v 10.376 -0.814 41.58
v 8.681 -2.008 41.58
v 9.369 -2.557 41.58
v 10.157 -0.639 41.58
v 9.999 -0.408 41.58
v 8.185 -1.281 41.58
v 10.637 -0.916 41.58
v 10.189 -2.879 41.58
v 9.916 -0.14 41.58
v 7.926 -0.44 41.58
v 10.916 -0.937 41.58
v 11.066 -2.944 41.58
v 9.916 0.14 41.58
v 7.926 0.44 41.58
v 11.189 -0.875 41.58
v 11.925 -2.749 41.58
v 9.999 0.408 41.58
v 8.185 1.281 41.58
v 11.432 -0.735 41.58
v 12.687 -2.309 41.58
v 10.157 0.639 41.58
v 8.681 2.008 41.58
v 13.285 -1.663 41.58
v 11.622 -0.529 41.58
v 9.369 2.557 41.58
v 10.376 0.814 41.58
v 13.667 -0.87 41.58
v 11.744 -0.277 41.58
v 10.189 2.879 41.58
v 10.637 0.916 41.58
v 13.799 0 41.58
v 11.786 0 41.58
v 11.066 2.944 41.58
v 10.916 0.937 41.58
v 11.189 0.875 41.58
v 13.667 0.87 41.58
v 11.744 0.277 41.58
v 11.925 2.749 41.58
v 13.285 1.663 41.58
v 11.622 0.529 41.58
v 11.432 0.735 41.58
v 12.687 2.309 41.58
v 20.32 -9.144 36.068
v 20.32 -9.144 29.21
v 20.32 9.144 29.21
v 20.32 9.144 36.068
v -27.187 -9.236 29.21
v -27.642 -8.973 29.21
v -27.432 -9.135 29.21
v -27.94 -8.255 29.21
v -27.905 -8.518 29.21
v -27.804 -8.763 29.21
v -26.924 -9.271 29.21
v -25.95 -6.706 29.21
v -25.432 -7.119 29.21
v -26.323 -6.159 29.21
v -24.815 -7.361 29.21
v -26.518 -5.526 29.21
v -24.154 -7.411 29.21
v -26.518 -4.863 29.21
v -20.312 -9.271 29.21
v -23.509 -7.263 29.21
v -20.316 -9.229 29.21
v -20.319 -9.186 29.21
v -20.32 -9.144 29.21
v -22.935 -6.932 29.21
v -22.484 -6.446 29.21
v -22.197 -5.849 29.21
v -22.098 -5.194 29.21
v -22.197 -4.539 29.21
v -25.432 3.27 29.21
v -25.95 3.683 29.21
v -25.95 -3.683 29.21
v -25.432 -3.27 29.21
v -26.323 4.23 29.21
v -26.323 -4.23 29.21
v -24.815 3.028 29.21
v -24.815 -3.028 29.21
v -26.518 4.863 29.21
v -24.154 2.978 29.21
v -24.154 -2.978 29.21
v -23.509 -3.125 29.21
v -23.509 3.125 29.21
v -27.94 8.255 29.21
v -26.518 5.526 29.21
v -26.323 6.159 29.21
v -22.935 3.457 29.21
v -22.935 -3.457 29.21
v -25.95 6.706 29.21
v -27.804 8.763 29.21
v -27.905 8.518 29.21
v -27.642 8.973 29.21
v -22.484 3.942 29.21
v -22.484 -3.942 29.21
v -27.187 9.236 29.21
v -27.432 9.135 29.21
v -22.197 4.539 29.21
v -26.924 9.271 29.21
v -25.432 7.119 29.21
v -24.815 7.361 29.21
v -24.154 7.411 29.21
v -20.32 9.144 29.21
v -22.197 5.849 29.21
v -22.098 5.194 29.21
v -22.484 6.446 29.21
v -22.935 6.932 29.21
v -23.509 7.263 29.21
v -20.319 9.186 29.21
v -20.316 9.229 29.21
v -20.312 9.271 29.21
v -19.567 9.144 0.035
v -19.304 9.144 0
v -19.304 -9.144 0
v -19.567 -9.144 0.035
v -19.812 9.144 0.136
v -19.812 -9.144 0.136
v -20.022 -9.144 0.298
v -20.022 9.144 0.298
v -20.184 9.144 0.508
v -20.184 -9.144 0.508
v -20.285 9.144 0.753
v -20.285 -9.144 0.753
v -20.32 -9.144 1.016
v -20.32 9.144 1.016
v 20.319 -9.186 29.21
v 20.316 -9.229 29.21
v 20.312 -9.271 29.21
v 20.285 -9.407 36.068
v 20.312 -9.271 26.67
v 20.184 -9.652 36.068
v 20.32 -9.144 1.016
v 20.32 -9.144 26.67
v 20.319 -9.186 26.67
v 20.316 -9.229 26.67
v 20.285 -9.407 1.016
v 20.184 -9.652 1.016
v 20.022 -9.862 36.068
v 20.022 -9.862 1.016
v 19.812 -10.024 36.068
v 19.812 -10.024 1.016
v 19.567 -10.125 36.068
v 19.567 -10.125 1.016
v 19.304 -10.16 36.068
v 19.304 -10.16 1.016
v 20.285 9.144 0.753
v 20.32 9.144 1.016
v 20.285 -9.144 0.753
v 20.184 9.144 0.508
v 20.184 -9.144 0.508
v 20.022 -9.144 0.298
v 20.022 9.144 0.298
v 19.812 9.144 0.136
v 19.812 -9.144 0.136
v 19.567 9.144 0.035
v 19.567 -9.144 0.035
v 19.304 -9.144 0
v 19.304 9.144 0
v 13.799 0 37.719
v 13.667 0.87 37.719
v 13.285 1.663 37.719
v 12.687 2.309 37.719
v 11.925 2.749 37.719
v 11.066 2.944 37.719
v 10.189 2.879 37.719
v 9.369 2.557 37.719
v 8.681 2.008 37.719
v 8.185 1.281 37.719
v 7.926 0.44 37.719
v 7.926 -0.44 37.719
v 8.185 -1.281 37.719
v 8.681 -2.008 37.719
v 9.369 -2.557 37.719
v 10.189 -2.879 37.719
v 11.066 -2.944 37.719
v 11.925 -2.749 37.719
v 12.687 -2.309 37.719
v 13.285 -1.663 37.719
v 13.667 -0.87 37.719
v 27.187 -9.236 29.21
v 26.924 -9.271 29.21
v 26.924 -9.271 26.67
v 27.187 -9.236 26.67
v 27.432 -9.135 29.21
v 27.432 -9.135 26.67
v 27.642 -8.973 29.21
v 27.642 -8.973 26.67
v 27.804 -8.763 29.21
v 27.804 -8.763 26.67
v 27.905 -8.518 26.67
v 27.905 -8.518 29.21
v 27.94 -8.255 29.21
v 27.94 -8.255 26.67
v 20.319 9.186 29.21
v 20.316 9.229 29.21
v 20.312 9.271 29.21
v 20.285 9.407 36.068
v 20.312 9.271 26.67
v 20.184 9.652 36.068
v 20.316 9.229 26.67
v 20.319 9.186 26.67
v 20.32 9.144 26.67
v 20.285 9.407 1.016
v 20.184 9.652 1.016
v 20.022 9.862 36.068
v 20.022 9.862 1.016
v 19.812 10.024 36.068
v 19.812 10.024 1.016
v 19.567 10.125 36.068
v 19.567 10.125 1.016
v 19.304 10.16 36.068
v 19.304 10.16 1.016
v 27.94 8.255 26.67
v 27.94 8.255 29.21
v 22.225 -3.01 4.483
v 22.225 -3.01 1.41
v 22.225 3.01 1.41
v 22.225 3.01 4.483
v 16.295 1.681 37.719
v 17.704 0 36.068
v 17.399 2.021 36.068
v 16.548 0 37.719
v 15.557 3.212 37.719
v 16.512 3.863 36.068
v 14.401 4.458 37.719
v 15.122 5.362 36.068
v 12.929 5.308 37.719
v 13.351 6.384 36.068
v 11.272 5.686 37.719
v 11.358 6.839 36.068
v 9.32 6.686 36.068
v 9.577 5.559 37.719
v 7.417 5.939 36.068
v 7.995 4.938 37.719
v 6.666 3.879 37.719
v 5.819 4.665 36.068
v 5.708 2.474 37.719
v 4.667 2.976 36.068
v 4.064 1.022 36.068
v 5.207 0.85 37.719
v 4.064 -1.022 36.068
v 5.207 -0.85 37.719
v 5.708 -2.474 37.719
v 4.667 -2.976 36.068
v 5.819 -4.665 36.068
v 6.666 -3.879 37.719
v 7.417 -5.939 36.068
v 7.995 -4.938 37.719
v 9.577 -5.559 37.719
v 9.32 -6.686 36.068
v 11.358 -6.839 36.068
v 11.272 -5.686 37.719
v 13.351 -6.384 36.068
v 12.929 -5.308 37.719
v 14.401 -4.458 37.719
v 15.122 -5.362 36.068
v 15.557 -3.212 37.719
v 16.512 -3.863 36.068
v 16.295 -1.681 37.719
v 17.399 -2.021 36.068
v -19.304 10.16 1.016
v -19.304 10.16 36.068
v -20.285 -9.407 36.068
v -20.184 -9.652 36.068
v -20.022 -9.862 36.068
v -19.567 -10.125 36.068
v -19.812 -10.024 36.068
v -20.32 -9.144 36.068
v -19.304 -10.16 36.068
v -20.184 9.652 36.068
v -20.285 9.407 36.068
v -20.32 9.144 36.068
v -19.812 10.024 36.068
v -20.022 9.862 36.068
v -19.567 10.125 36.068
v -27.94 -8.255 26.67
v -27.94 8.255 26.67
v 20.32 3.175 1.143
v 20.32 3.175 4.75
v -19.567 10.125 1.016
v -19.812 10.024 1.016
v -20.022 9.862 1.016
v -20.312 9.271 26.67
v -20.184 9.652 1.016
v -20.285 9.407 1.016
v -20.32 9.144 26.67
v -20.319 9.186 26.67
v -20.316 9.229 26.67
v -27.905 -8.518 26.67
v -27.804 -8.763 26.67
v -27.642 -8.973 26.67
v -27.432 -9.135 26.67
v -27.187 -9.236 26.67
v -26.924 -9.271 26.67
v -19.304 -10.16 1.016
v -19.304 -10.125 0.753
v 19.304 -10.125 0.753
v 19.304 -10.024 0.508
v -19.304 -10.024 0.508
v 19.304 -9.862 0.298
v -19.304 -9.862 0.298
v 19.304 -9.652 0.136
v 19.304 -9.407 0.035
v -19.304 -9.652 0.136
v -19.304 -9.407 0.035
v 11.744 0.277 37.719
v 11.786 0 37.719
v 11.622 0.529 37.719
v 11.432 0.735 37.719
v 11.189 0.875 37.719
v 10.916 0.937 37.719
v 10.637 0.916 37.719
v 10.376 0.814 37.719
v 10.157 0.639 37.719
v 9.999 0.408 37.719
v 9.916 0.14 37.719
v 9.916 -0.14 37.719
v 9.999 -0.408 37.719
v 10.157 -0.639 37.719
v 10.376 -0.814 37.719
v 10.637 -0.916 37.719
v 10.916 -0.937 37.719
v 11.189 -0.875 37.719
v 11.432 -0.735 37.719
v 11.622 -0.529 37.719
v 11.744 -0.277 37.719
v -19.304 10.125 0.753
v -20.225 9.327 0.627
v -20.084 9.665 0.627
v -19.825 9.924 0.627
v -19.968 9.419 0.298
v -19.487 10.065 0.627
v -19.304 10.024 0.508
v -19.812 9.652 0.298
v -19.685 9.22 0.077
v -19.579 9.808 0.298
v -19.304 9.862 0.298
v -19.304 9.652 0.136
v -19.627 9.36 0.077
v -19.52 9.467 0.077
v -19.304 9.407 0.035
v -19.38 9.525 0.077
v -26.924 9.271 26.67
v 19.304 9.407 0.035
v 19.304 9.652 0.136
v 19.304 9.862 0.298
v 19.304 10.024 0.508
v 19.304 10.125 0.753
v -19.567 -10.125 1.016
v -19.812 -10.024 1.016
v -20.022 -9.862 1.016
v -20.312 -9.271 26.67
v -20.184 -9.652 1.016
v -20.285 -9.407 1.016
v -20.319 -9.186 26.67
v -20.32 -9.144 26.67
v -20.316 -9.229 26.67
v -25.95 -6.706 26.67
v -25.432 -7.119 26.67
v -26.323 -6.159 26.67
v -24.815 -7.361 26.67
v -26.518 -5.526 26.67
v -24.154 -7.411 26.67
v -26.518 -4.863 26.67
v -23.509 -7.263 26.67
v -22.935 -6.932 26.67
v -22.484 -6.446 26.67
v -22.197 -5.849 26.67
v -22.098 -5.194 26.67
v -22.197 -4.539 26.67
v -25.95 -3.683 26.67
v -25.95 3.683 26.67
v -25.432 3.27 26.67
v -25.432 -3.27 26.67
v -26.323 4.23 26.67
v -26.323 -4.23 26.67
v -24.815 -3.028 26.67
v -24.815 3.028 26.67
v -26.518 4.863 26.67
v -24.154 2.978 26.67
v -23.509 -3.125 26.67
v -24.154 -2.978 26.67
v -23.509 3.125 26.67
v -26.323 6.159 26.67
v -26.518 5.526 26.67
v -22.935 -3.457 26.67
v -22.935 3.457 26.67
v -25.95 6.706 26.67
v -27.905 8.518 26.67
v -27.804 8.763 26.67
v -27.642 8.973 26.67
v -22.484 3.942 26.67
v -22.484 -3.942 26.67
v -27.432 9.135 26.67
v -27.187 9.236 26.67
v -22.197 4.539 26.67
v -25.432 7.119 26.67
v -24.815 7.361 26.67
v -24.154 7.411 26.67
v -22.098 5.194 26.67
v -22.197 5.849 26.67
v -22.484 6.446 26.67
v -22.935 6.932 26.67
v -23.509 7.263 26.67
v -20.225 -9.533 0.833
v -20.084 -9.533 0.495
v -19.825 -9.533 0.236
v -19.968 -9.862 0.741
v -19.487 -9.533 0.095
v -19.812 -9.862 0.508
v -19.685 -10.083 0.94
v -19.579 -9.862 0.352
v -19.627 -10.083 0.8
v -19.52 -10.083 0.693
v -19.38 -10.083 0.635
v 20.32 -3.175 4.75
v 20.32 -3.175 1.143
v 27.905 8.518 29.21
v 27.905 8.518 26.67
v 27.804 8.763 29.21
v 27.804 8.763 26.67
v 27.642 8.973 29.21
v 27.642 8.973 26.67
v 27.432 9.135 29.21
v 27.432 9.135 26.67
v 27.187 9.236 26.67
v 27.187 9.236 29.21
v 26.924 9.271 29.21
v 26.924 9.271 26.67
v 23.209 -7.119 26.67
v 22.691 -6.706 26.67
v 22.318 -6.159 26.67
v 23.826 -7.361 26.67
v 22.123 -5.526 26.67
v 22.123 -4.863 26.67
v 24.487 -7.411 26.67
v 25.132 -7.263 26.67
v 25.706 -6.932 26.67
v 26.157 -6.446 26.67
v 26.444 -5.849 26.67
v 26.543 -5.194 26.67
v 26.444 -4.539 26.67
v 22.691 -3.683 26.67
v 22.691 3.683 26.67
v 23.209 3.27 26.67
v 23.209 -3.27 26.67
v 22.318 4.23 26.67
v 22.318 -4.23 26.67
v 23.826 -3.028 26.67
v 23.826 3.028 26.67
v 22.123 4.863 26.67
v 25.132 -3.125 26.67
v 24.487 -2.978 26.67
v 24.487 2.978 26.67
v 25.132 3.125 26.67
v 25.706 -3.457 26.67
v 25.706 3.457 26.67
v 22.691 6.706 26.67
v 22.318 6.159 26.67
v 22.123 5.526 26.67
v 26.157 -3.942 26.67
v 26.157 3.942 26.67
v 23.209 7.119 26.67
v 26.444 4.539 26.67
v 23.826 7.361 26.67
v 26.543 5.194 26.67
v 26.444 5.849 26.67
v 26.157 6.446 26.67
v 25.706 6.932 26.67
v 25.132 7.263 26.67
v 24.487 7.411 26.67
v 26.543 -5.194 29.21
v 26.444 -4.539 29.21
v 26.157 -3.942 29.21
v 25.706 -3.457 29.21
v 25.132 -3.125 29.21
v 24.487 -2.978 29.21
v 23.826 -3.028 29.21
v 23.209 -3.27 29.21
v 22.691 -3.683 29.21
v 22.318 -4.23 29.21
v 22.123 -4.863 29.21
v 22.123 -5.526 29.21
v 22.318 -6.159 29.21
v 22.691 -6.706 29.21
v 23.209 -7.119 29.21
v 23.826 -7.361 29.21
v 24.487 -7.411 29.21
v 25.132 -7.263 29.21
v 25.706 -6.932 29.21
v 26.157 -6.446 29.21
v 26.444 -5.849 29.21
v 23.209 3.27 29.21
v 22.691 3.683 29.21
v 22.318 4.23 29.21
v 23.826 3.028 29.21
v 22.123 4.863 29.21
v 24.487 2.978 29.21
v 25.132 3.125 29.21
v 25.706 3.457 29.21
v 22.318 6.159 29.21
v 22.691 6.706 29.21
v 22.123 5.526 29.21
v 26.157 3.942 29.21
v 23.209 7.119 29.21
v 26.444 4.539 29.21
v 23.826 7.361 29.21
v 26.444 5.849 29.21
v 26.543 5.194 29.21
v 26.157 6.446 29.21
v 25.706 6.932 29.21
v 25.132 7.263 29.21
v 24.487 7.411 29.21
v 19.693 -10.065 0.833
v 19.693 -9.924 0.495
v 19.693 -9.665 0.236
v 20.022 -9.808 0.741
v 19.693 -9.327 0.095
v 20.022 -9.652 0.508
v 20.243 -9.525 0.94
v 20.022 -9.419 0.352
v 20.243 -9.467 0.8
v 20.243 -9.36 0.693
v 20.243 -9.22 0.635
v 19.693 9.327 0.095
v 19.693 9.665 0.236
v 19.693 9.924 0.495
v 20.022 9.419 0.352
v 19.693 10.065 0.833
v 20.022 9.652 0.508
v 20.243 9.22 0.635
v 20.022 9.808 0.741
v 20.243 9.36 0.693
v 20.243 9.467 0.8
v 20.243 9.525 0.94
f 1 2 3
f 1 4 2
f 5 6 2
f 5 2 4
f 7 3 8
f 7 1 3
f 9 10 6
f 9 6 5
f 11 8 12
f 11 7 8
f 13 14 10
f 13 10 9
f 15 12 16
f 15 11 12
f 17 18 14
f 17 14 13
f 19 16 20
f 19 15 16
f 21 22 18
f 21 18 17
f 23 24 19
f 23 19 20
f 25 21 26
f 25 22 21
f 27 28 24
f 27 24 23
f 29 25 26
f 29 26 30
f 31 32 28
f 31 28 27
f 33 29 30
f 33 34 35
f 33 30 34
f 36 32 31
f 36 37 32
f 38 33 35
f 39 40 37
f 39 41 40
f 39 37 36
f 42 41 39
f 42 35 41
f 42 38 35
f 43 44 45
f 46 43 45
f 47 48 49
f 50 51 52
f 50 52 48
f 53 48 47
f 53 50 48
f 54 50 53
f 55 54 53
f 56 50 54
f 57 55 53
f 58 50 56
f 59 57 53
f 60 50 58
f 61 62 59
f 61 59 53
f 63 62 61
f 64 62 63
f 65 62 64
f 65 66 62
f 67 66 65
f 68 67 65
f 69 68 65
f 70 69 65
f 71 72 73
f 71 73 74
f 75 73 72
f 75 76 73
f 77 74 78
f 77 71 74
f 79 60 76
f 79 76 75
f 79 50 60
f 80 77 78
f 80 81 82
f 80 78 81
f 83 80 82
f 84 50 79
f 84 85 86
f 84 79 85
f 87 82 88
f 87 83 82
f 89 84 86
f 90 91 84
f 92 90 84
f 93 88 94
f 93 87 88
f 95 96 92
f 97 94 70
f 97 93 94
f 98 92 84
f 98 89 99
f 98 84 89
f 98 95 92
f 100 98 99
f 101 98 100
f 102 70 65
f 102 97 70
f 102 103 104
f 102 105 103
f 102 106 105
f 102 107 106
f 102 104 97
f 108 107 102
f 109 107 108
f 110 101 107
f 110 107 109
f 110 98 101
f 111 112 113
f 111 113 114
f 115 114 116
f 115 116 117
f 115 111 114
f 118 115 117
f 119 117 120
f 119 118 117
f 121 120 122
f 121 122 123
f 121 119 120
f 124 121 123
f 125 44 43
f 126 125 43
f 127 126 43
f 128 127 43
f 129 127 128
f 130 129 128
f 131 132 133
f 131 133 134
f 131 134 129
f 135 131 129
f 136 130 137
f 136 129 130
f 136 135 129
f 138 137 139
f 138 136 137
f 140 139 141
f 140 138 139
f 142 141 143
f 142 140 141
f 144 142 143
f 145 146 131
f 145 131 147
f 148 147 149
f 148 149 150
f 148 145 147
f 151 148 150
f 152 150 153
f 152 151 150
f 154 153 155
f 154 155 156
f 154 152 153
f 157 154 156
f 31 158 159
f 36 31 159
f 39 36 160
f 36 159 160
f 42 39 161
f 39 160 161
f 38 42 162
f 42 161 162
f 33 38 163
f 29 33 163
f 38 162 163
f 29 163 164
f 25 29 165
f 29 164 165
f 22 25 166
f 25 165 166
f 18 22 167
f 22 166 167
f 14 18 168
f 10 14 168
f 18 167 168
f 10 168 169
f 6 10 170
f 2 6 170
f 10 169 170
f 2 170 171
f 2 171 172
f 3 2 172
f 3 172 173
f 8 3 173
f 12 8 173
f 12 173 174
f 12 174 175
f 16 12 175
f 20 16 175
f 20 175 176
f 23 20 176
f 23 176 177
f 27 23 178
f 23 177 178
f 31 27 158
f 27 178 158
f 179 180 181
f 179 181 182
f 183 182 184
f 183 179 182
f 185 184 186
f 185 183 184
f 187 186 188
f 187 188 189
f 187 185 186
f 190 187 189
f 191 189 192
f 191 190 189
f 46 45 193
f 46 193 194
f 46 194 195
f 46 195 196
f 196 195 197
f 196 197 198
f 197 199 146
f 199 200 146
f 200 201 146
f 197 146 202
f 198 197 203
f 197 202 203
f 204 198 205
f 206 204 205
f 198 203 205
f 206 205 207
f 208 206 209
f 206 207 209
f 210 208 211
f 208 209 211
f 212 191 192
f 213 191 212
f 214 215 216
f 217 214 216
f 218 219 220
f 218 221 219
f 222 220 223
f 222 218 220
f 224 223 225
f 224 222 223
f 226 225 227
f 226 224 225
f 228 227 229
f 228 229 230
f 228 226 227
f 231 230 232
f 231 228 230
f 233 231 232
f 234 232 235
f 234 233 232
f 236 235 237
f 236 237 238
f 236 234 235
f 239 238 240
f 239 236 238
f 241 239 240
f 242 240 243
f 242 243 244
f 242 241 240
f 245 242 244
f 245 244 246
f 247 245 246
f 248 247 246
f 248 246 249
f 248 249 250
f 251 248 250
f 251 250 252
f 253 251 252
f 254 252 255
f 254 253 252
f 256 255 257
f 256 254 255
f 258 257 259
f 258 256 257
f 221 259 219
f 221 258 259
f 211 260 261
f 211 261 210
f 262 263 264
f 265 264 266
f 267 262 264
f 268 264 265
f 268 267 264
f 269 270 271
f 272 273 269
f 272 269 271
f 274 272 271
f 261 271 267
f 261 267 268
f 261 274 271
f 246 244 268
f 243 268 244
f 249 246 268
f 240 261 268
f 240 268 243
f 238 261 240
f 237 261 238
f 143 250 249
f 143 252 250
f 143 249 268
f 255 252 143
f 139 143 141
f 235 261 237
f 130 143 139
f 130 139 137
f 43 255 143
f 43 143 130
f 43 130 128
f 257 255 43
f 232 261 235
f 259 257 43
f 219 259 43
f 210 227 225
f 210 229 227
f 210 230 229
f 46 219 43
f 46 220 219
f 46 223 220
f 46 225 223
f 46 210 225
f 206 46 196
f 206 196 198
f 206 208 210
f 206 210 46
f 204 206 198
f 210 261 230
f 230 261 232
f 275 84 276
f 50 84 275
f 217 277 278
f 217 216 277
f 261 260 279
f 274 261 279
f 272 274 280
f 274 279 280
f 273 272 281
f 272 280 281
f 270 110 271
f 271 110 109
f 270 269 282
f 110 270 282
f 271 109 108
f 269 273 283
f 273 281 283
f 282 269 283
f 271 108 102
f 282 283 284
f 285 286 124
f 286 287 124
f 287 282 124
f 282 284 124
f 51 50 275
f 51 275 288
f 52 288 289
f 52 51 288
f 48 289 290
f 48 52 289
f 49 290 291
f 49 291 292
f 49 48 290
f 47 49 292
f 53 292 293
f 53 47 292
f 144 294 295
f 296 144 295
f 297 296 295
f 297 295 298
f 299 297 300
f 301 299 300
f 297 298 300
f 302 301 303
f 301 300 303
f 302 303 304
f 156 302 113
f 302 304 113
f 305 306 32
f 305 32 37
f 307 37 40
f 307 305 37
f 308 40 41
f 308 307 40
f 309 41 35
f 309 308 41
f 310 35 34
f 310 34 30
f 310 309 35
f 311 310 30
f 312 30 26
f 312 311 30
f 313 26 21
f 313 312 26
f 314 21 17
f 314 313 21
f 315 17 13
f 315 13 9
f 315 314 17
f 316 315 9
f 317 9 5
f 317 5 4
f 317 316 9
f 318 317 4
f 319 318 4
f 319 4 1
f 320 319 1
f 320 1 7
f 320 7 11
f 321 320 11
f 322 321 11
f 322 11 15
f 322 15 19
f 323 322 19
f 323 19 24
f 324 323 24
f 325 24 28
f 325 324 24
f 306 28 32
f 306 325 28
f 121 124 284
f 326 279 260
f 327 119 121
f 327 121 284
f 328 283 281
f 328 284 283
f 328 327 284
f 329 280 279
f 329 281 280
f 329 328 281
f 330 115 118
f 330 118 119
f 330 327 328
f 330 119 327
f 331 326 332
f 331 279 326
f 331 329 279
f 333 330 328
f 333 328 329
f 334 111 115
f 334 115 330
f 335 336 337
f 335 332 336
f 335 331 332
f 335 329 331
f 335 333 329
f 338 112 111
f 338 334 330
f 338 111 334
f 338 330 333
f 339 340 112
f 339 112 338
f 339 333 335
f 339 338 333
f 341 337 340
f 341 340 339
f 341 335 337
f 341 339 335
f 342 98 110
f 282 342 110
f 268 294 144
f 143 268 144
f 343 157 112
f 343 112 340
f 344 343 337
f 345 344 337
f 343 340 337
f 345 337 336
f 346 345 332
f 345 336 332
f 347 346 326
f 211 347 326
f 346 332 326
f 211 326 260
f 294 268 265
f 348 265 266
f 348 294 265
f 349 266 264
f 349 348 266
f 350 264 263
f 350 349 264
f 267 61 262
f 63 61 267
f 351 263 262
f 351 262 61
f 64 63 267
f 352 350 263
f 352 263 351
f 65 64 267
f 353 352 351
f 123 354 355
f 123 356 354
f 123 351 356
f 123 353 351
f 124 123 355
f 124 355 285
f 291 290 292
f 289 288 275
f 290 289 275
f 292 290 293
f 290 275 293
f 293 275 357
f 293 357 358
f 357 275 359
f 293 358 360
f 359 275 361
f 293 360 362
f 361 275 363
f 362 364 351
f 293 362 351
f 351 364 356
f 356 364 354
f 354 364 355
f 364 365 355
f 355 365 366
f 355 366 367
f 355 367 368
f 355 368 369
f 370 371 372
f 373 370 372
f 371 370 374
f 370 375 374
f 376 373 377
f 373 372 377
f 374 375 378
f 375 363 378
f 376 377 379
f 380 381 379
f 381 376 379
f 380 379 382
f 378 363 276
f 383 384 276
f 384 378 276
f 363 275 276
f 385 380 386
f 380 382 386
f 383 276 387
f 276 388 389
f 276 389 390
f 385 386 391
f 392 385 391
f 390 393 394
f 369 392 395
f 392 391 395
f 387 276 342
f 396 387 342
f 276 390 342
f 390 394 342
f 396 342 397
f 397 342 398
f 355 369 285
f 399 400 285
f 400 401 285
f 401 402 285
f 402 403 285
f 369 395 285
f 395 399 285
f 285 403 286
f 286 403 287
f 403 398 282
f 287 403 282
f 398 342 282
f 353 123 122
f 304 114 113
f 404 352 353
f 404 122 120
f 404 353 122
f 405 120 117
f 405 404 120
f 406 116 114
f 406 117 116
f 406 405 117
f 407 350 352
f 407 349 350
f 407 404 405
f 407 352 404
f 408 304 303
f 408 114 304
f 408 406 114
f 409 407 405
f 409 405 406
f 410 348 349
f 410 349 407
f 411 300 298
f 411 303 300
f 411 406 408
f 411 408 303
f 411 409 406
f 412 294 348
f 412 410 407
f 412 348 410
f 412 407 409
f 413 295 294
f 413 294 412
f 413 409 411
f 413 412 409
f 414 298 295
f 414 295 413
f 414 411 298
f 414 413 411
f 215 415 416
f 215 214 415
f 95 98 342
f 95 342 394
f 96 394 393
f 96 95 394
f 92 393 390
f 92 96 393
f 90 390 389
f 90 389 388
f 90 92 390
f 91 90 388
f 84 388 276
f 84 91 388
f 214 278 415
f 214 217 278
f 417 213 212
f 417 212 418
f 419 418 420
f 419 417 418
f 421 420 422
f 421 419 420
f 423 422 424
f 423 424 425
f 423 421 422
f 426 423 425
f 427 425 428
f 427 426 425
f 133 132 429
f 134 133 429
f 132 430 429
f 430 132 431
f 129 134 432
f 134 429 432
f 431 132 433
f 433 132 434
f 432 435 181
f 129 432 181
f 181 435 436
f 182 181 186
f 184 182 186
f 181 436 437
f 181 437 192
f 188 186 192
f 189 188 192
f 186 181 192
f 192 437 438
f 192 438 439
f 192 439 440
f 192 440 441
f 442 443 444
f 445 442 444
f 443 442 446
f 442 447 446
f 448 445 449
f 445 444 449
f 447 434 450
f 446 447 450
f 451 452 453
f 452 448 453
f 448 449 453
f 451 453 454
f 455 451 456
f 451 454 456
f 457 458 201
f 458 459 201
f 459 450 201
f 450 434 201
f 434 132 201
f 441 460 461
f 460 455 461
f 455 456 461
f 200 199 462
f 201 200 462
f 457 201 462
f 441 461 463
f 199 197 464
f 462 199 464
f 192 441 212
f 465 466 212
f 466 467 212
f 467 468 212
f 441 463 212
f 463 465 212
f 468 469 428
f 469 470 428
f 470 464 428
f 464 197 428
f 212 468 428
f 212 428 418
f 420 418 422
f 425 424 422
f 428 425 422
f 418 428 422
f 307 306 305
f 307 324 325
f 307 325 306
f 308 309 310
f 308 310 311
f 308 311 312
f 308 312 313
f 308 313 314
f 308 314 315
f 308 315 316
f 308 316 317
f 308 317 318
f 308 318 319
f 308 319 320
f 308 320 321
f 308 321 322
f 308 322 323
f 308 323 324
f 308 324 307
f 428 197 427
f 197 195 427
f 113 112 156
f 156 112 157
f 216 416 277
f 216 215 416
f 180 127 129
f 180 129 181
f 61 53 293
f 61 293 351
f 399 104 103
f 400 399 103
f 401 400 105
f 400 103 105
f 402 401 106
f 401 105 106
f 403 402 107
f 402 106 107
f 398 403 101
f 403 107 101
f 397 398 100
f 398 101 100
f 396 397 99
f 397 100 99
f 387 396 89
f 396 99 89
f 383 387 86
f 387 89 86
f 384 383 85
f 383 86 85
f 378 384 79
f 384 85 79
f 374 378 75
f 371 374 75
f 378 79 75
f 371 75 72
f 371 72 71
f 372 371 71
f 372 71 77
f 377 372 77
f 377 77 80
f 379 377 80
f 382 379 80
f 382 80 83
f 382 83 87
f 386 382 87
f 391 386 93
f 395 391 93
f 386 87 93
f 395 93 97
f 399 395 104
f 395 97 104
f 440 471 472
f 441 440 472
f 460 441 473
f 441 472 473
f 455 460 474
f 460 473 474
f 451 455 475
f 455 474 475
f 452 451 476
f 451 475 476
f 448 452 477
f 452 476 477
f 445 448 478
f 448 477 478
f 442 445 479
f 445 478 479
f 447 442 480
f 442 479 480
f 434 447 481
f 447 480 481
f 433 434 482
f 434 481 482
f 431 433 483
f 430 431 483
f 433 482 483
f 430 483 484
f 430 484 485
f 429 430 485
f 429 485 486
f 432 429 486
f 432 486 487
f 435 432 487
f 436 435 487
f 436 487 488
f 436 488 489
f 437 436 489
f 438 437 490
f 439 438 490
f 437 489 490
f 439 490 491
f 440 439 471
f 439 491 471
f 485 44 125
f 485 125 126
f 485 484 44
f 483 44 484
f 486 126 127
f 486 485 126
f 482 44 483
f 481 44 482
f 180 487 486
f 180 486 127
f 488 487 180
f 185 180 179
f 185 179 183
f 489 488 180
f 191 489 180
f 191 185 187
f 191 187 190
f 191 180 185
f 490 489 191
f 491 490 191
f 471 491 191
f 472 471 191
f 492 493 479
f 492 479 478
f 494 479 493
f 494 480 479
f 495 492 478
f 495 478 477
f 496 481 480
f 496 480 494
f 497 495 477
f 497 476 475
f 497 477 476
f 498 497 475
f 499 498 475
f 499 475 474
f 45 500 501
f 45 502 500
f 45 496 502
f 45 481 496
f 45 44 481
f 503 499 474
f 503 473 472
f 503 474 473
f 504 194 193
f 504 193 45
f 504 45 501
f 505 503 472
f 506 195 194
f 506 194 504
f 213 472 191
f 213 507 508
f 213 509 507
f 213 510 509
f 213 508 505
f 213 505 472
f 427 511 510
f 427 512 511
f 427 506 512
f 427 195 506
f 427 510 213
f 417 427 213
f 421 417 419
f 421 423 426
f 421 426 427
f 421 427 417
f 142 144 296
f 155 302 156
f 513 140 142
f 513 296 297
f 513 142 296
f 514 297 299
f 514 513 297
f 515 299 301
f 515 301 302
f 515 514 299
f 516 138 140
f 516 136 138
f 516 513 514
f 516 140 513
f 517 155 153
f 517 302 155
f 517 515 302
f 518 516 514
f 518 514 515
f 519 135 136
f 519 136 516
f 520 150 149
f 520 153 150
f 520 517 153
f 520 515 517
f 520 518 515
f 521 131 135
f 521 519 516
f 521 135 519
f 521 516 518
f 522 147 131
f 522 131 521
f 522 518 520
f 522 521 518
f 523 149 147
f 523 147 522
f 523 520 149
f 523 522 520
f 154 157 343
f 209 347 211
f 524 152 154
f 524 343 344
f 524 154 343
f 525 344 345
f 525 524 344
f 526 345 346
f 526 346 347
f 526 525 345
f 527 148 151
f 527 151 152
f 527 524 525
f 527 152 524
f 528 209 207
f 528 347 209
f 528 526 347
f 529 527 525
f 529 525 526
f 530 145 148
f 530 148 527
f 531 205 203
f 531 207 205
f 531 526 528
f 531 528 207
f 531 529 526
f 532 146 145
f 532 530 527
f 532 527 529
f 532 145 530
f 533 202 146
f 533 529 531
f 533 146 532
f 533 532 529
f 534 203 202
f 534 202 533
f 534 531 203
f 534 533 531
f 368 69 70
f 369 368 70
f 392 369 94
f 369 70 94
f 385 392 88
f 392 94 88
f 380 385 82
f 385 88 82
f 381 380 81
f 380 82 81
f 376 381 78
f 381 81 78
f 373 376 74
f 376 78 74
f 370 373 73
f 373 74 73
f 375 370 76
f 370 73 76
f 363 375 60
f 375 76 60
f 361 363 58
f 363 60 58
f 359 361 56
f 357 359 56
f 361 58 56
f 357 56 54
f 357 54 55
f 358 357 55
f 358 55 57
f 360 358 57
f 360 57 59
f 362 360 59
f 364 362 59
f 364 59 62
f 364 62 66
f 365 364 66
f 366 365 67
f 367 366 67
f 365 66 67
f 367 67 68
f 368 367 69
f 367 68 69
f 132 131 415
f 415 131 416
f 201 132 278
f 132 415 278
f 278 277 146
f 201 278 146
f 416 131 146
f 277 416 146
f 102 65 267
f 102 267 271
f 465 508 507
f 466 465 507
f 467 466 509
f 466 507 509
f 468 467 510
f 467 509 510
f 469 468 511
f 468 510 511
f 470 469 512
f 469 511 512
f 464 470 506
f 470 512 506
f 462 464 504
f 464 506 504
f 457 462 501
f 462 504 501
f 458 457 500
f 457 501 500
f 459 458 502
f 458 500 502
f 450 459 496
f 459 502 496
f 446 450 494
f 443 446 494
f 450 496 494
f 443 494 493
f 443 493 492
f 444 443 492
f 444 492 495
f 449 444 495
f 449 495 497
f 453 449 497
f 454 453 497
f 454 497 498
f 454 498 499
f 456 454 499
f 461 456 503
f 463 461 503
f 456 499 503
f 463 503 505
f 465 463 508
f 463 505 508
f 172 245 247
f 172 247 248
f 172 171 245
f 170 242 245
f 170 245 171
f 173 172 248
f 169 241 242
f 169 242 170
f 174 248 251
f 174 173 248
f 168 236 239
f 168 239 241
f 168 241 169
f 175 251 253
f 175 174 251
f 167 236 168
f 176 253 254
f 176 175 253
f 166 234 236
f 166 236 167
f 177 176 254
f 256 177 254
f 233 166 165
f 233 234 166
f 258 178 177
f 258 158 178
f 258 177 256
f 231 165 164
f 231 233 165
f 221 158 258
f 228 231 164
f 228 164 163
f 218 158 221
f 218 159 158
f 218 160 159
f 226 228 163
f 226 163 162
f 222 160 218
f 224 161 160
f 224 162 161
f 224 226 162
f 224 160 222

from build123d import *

# Parameters (mm, degrees)
F0_W           = 40.64
F0_H           = 20.32
F1_DEPTH       = 36.068
F2_W           = 6.35
F2_H           = 3.6068
F4_W           = 6.0198
F4_H           = 3.0734
F7_R           = 2.2225
F8_DEPTH       = 2.54
F9_R           = 6.858
F11_R          = 5.7023
F13_T1_DEPTH   = 38.608
F13_T3_DEPTH   = 18.288
F13_S7_W       = 1.016
F13_S7_H       = 1.016
F13_T8_DEPTH   = 1.016
F13_S13_W      = 1.016
F13_S13_H      = 1.016
F13_T14_DEPTH  = 1.016
F13_S19_W      = 1.016
F13_S19_H      = 1.016
F13_T20_DEPTH  = 1.016
F13_S25_W      = 1.016
F13_S25_H      = 1.016
F13_T26_DEPTH  = 1.016
F13_T32_DEPTH  = 37.592
F13_T38_DEPTH  = 37.592
F13_T44_DEPTH  = 37.592
F13_T51_DEPTH  = 37.592
F13_T57_DEPTH  = 37.592
F13_T63_DEPTH  = 37.592
F13_T69_DEPTH  = 37.592
F13_T75_DEPTH  = 37.592
F13_T82_DEPTH  = 37.592
F13_T88_DEPTH  = 37.592
F13_T94_DEPTH  = 37.592
F13_T100_DEPTH = 37.592
F13_T106_DEPTH = 37.592
F13_T113_DEPTH = 37.592
F13_T119_DEPTH = 37.592
F13_T125_DEPTH = 37.592
F13_T131_DEPTH = 37.592
F13_T137_DEPTH = 37.592
F13_T144_DEPTH = 37.592
F13_T150_DEPTH = 37.592
F14_R          = 2.95275
F14_R_2        = 0.9398
F15_DEPTH      = 3.8608


# Not quite as in the source:
# - a fillet or chamfer that OpenCascade refuses, or shapes differently, is made with other operations: its cross-section is extruded or revolved along the edge and cut away or added


with BuildPart() as f1:
    # F0 (on Top) → F1 (new body)
    with BuildSketch(Plane.XY):
        Rectangle(F0_W, F0_H)
    extrude(amount=F1_DEPTH)

    # F2 (on face) → F5 section 0
    with BuildSketch(Plane.YZ.offset(20.32)):
        with Locations((0, 2.9464)):
            Rectangle(F2_W, F2_H)
    # F4 (on offset) → F5 section 1
    with BuildSketch(Plane.YZ.offset(22.225)):
        with Locations((0, 2.9464)):
            Rectangle(F4_W, F4_H)
    loft()

    # F7 (on offset) → F8 (join)
    with BuildSketch(Plane.XY.offset(29.21)):
        with BuildLine():
            ThreePointArc((-27.94, -8.255), (-27.6424204897, -8.9734204897), (-26.924, -9.271))
            Line((-26.924, -9.271), (-20.32, -9.271))
            Line((-20.32, -9.271), (-20.32, 9.271))
            Line((-20.32, 9.271), (-26.924, 9.271))
            ThreePointArc((-26.924, 9.271), (-27.6424204897, 8.9734204897), (-27.94, 8.255))
            Line((-27.94, 8.255), (-27.94, -8.255))
        make_face()
        with Locations((-24.3205, -5.1943)):
            Circle(F7_R, mode=Mode.SUBTRACT)
        with Locations((-24.3205, 5.1943)):
            Circle(F7_R, mode=Mode.SUBTRACT)
        with BuildLine():
            ThreePointArc((27.94, 8.255), (27.6424204897, 8.9734204897), (26.924, 9.271))
            Line((26.924, 9.271), (20.32, 9.271))
            Line((20.32, 9.271), (20.32, -9.271))
            Line((20.32, -9.271), (26.924, -9.271))
            ThreePointArc((26.924, -9.271), (27.6424204897, -8.9734204897), (27.94, -8.255))
            Line((27.94, -8.255), (27.94, 8.255))
        make_face()
        with Locations((24.3205, -5.1943)):
            Circle(F7_R, mode=Mode.SUBTRACT)
        with Locations((24.3205, 5.1943)):
            Circle(F7_R, mode=Mode.SUBTRACT)
    extrude(amount=-F8_DEPTH)

    # F9 (on face) → F12 section 0
    with BuildSketch(Plane.XY.offset(36.068)):
        with Locations((10.8458, 0)):
            Circle(F9_R)
    # F11 (on offset) → F12 section 1
    with BuildSketch(Plane.XY.offset(37.719)):
        with Locations((10.8458, 0)):
            Circle(F11_R)
    loft()

    # F13: fillet of radius 1.016 on 8 edges, made by hand

    # F13_s2 → F13_t1 (cut)
    with BuildSketch(Plane.YZ.offset(-19.304)):
        with BuildLine():
            ThreePointArc((-10.16, 1.016), (-9.8624204897, 0.2975795103), (-9.144, 0))
            Line((-9.144, 0), (-10.16, 0))
            Line((-10.16, 0), (-10.16, 1.016))
        make_face()
        with BuildLine():
            ThreePointArc((9.144, 0), (9.8624204897, 0.2975795103), (10.16, 1.016))
            Line((10.16, 1.016), (10.16, 0))
            Line((10.16, 0), (9.144, 0))
        make_face()
    extrude(amount=F13_T1_DEPTH, mode=Mode.SUBTRACT)

    # F13_s4 → F13_t3 (cut)
    with BuildSketch(Plane.XZ.offset(-9.144)):
        with BuildLine():
            ThreePointArc((20.32, 1.016), (20.0224204897, 0.2975795103), (19.304, 0))
            Line((19.304, 0), (20.32, 0))
            Line((20.32, 0), (20.32, 1.016))
        make_face()
        with BuildLine():
            ThreePointArc((-19.304, 0), (-20.0224204897, 0.2975795103), (-20.32, 1.016))
            Line((-20.32, 1.016), (-20.32, 0))
            Line((-20.32, 0), (-19.304, 0))
        make_face()
    extrude(amount=F13_T3_DEPTH, mode=Mode.SUBTRACT)


with BuildPart() as f13_tool6:
    # F13_s7 → F13_t8 (new body)
    with BuildSketch(Plane.YZ.offset(19.304)):
        with Locations((-9.652, 0.508)):
            Rectangle(F13_S7_W, F13_S7_H)
    extrude(amount=F13_T8_DEPTH)

    # F13_s9 → F13_t10 (revolve, cut)
    with BuildSketch(Plane(origin=(19.304, -9.144, 1.016), x_dir=(0, 0.7071067812, 0.7071067812), z_dir=(0, 0.7071067812, -0.7071067812))):
        with BuildLine():
            ThreePointArc((0, -1.016), (1.016, 0), (0, 1.016))
            Line((0, 1.016), (0, -1.016))
        make_face()
    revolve(axis=Axis((19.304, -9.144, 1.016), (1, 0, 0)), mode=Mode.SUBTRACT)


with BuildPart() as f1_1:
    add(f1.part)

    # F13_t5: cut F13_tool6
    add(f13_tool6.part, mode=Mode.SUBTRACT)


with BuildPart() as f13_tool12:
    # F13_s13 → F13_t14 (new body)
    with BuildSketch(Plane.YZ.offset(19.304)):
        with Locations((9.652, 0.508)):
            Rectangle(F13_S13_W, F13_S13_H)
    extrude(amount=F13_T14_DEPTH)

    # F13_s15 → F13_t16 (revolve, cut)
    with BuildSketch(Plane(origin=(19.304, 9.144, 1.016), x_dir=(0, -0.7071067812, 0.7071067812), z_dir=(0, 0.7071067812, 0.7071067812))):
        with BuildLine():
            ThreePointArc((0, -1.016), (1.016, 0), (0, 1.016))
            Line((0, 1.016), (0, -1.016))
        make_face()
    revolve(axis=Axis((19.304, 9.144, 1.016), (1, 0, 0)), mode=Mode.SUBTRACT)


with BuildPart() as f1_2:
    add(f1_1.part)

    # F13_t11: cut F13_tool12
    add(f13_tool12.part, mode=Mode.SUBTRACT)


with BuildPart() as f13_tool18:
    # F13_s19 → F13_t20 (new body)
    with BuildSketch(Plane.XY.offset(1.016)):
        with Locations((-19.812, 9.652)):
            Rectangle(F13_S19_W, F13_S19_H)
    extrude(amount=-F13_T20_DEPTH)

    # F13_s21 → F13_t22 (revolve, cut)
    with BuildSketch(Plane(origin=(-19.304, 9.144, 1.016), x_dir=(0.7071067812, -0.7071067812, 0), z_dir=(0.7071067812, 0.7071067812, 0))):
        with BuildLine():
            ThreePointArc((0, -1.016), (1.016, 0), (0, 1.016))
            Line((0, 1.016), (0, -1.016))
        make_face()
    revolve(axis=Axis((-19.304, 9.144, 1.016), (0, 0, -1)), mode=Mode.SUBTRACT)


with BuildPart() as f1_3:
    add(f1_2.part)

    # F13_t17: cut F13_tool18
    add(f13_tool18.part, mode=Mode.SUBTRACT)


with BuildPart() as f13_tool24:
    # F13_s25 → F13_t26 (new body)
    with BuildSketch(Plane.XZ.offset(9.144)):
        with Locations((-19.812, 0.508)):
            Rectangle(F13_S25_W, F13_S25_H)
    extrude(amount=F13_T26_DEPTH)

    # F13_s27 → F13_t28 (revolve, cut)
    with BuildSketch(Plane(origin=(-19.304, -9.144, 1.016), x_dir=(0.7071067812, 0, 0.7071067812), z_dir=(0.7071067812, 0, -0.7071067812))):
        with BuildLine():
            ThreePointArc((0, -1.016), (1.016, 0), (0, 1.016))
            Line((0, 1.016), (0, -1.016))
        make_face()
    revolve(axis=Axis((-19.304, -9.144, 1.016), (0, -1, 0)), mode=Mode.SUBTRACT)


with BuildPart() as f1_4:
    add(f1_3.part)

    # F13_t23: cut F13_tool24
    add(f13_tool24.part, mode=Mode.SUBTRACT)


with BuildPart() as f13_tool30:
    # F13_s31 → F13_t32 (new body)
    with BuildSketch(Plane.XY.offset(1.016)):
        with BuildLine():
            ThreePointArc((20.32, -9.144), (20.0224204897, -9.8624204897), (19.304, -10.16))
            Line((19.304, -10.16), (20.32, -10.16))
            Line((20.32, -10.16), (20.32, -9.144))
        make_face()
    extrude(amount=F13_T32_DEPTH)

    split(bisect_by=Plane.XY.offset(26.67), keep=Keep.BOTTOM)

    split(bisect_by=Plane.XZ.offset(9.271), keep=Keep.BOTTOM)


with BuildPart() as f1_5:
    add(f1_4.part)

    # F13_t29: cut F13_tool30
    add(f13_tool30.part, mode=Mode.SUBTRACT)


with BuildPart() as f13_tool36:
    # F13_s37 → F13_t38 (new body)
    with BuildSketch(Plane.XY.offset(1.016)):
        with BuildLine():
            ThreePointArc((20.32, -9.144), (20.0224204897, -9.8624204897), (19.304, -10.16))
            Line((19.304, -10.16), (20.32, -10.16))
            Line((20.32, -10.16), (20.32, -9.144))
        make_face()
    extrude(amount=F13_T38_DEPTH)

    split(bisect_by=Plane.XY.offset(26.67), keep=Keep.BOTTOM)

    split(bisect_by=Plane.XZ.offset(9.271), keep=Keep.TOP)


with BuildPart() as f1_6:
    add(f1_5.part)

    # F13_t35: cut F13_tool36
    add(f13_tool36.part, mode=Mode.SUBTRACT)


with BuildPart() as f13_tool42:
    # F13_s43 → F13_t44 (new body)
    with BuildSketch(Plane.XY.offset(1.016)):
        with BuildLine():
            ThreePointArc((20.32, -9.144), (20.0224204897, -9.8624204897), (19.304, -10.16))
            Line((19.304, -10.16), (20.32, -10.16))
            Line((20.32, -10.16), (20.32, -9.144))
        make_face()
    extrude(amount=F13_T44_DEPTH)

    split(bisect_by=Plane.XY.offset(26.67), keep=Keep.TOP)

    split(bisect_by=Plane.XZ.offset(9.271), keep=Keep.TOP)

    split(bisect_by=Plane.XY.offset(29.21), keep=Keep.BOTTOM)


with BuildPart() as f1_7:
    add(f1_6.part)

    # F13_t41: cut F13_tool42
    add(f13_tool42.part, mode=Mode.SUBTRACT)


with BuildPart() as f13_tool49:
    # F13_s50 → F13_t51 (new body)
    with BuildSketch(Plane.XY.offset(1.016)):
        with BuildLine():
            ThreePointArc((20.32, -9.144), (20.0224204897, -9.8624204897), (19.304, -10.16))
            Line((19.304, -10.16), (20.32, -10.16))
            Line((20.32, -10.16), (20.32, -9.144))
        make_face()
    extrude(amount=F13_T51_DEPTH)

    split(bisect_by=Plane.XZ.offset(9.271), keep=Keep.BOTTOM)

    split(bisect_by=Plane.XY.offset(29.21), keep=Keep.TOP)


with BuildPart() as f1_8:
    add(f1_7.part)

    # F13_t48: cut F13_tool49
    add(f13_tool49.part, mode=Mode.SUBTRACT)


with BuildPart() as f13_tool55:
    # F13_s56 → F13_t57 (new body)
    with BuildSketch(Plane.XY.offset(1.016)):
        with BuildLine():
            ThreePointArc((20.32, -9.144), (20.0224204897, -9.8624204897), (19.304, -10.16))
            Line((19.304, -10.16), (20.32, -10.16))
            Line((20.32, -10.16), (20.32, -9.144))
        make_face()
    extrude(amount=F13_T57_DEPTH)

    split(bisect_by=Plane.XZ.offset(9.271), keep=Keep.TOP)

    split(bisect_by=Plane.XY.offset(29.21), keep=Keep.TOP)


with BuildPart() as f1_9:
    add(f1_8.part)

    # F13_t54: cut F13_tool55
    add(f13_tool55.part, mode=Mode.SUBTRACT)


with BuildPart() as f13_tool61:
    # F13_s62 → F13_t63 (new body)
    with BuildSketch(Plane.XY.offset(1.016)):
        with BuildLine():
            ThreePointArc((20.32, 9.144), (20.0224204897, 9.8624204897), (19.304, 10.16))
            Line((19.304, 10.16), (20.32, 10.16))
            Line((20.32, 10.16), (20.32, 9.144))
        make_face()
    extrude(amount=F13_T63_DEPTH)

    split(bisect_by=Plane.XZ.offset(-9.271), keep=Keep.TOP)

    split(bisect_by=Plane.XY.offset(26.67), keep=Keep.BOTTOM)


with BuildPart() as f1_10:
    add(f1_9.part)

    # F13_t60: cut F13_tool61
    add(f13_tool61.part, mode=Mode.SUBTRACT)


with BuildPart() as f13_tool67:
    # F13_s68 → F13_t69 (new body)
    with BuildSketch(Plane.XY.offset(1.016)):
        with BuildLine():
            ThreePointArc((20.32, 9.144), (20.0224204897, 9.8624204897), (19.304, 10.16))
            Line((19.304, 10.16), (20.32, 10.16))
            Line((20.32, 10.16), (20.32, 9.144))
        make_face()
    extrude(amount=F13_T69_DEPTH)

    split(bisect_by=Plane.XZ.offset(-9.271), keep=Keep.BOTTOM)

    split(bisect_by=Plane.XY.offset(26.67), keep=Keep.BOTTOM)


with BuildPart() as f1_11:
    add(f1_10.part)

    # F13_t66: cut F13_tool67
    add(f13_tool67.part, mode=Mode.SUBTRACT)


with BuildPart() as f13_tool73:
    # F13_s74 → F13_t75 (new body)
    with BuildSketch(Plane.XY.offset(1.016)):
        with BuildLine():
            ThreePointArc((20.32, 9.144), (20.0224204897, 9.8624204897), (19.304, 10.16))
            Line((19.304, 10.16), (20.32, 10.16))
            Line((20.32, 10.16), (20.32, 9.144))
        make_face()
    extrude(amount=F13_T75_DEPTH)

    split(bisect_by=Plane.XZ.offset(-9.271), keep=Keep.BOTTOM)

    split(bisect_by=Plane.XY.offset(26.67), keep=Keep.TOP)

    split(bisect_by=Plane.XY.offset(29.21), keep=Keep.BOTTOM)


with BuildPart() as f1_12:
    add(f1_11.part)

    # F13_t72: cut F13_tool73
    add(f13_tool73.part, mode=Mode.SUBTRACT)


with BuildPart() as f13_tool80:
    # F13_s81 → F13_t82 (new body)
    with BuildSketch(Plane.XY.offset(1.016)):
        with BuildLine():
            ThreePointArc((20.32, 9.144), (20.0224204897, 9.8624204897), (19.304, 10.16))
            Line((19.304, 10.16), (20.32, 10.16))
            Line((20.32, 10.16), (20.32, 9.144))
        make_face()
    extrude(amount=F13_T82_DEPTH)

    split(bisect_by=Plane.XZ.offset(-9.271), keep=Keep.TOP)

    split(bisect_by=Plane.XY.offset(29.21), keep=Keep.TOP)


with BuildPart() as f1_13:
    add(f1_12.part)

    # F13_t79: cut F13_tool80
    add(f13_tool80.part, mode=Mode.SUBTRACT)


with BuildPart() as f13_tool86:
    # F13_s87 → F13_t88 (new body)
    with BuildSketch(Plane.XY.offset(1.016)):
        with BuildLine():
            ThreePointArc((20.32, 9.144), (20.0224204897, 9.8624204897), (19.304, 10.16))
            Line((19.304, 10.16), (20.32, 10.16))
            Line((20.32, 10.16), (20.32, 9.144))
        make_face()
    extrude(amount=F13_T88_DEPTH)

    split(bisect_by=Plane.XZ.offset(-9.271), keep=Keep.BOTTOM)

    split(bisect_by=Plane.XY.offset(29.21), keep=Keep.TOP)


with BuildPart() as f1_14:
    add(f1_13.part)

    # F13_t85: cut F13_tool86
    add(f13_tool86.part, mode=Mode.SUBTRACT)


with BuildPart() as f13_tool92:
    # F13_s93 → F13_t94 (new body)
    with BuildSketch(Plane.XY.offset(1.016)):
        with BuildLine():
            ThreePointArc((-19.304, 10.16), (-20.0224204897, 9.8624204897), (-20.32, 9.144))
            Line((-20.32, 9.144), (-20.32, 10.16))
            Line((-20.32, 10.16), (-19.304, 10.16))
        make_face()
    extrude(amount=F13_T94_DEPTH)

    split(bisect_by=Plane.XY.offset(26.67), keep=Keep.BOTTOM)

    split(bisect_by=Plane.XZ.offset(-9.271), keep=Keep.BOTTOM)


with BuildPart() as f1_15:
    add(f1_14.part)

    # F13_t91: cut F13_tool92
    add(f13_tool92.part, mode=Mode.SUBTRACT)


with BuildPart() as f13_tool98:
    # F13_s99 → F13_t100 (new body)
    with BuildSketch(Plane.XY.offset(1.016)):
        with BuildLine():
            ThreePointArc((-19.304, 10.16), (-20.0224204897, 9.8624204897), (-20.32, 9.144))
            Line((-20.32, 9.144), (-20.32, 10.16))
            Line((-20.32, 10.16), (-19.304, 10.16))
        make_face()
    extrude(amount=F13_T100_DEPTH)

    split(bisect_by=Plane.XY.offset(26.67), keep=Keep.BOTTOM)

    split(bisect_by=Plane.XZ.offset(-9.271), keep=Keep.TOP)


with BuildPart() as f1_16:
    add(f1_15.part)

    # F13_t97: cut F13_tool98
    add(f13_tool98.part, mode=Mode.SUBTRACT)


with BuildPart() as f13_tool104:
    # F13_s105 → F13_t106 (new body)
    with BuildSketch(Plane.XY.offset(1.016)):
        with BuildLine():
            ThreePointArc((-19.304, 10.16), (-20.0224204897, 9.8624204897), (-20.32, 9.144))
            Line((-20.32, 9.144), (-20.32, 10.16))
            Line((-20.32, 10.16), (-19.304, 10.16))
        make_face()
    extrude(amount=F13_T106_DEPTH)

    split(bisect_by=Plane.XY.offset(26.67), keep=Keep.TOP)

    split(bisect_by=Plane.XZ.offset(-9.271), keep=Keep.BOTTOM)

    split(bisect_by=Plane.XY.offset(29.21), keep=Keep.BOTTOM)


with BuildPart() as f1_17:
    add(f1_16.part)

    # F13_t103: cut F13_tool104
    add(f13_tool104.part, mode=Mode.SUBTRACT)


with BuildPart() as f13_tool111:
    # F13_s112 → F13_t113 (new body)
    with BuildSketch(Plane.XY.offset(1.016)):
        with BuildLine():
            ThreePointArc((-19.304, 10.16), (-20.0224204897, 9.8624204897), (-20.32, 9.144))
            Line((-20.32, 9.144), (-20.32, 10.16))
            Line((-20.32, 10.16), (-19.304, 10.16))
        make_face()
    extrude(amount=F13_T113_DEPTH)

    split(bisect_by=Plane.XZ.offset(-9.271), keep=Keep.BOTTOM)

    split(bisect_by=Plane.XY.offset(29.21), keep=Keep.TOP)


with BuildPart() as f1_18:
    add(f1_17.part)

    # F13_t110: cut F13_tool111
    add(f13_tool111.part, mode=Mode.SUBTRACT)


with BuildPart() as f13_tool117:
    # F13_s118 → F13_t119 (new body)
    with BuildSketch(Plane.XY.offset(1.016)):
        with BuildLine():
            ThreePointArc((-19.304, 10.16), (-20.0224204897, 9.8624204897), (-20.32, 9.144))
            Line((-20.32, 9.144), (-20.32, 10.16))
            Line((-20.32, 10.16), (-19.304, 10.16))
        make_face()
    extrude(amount=F13_T119_DEPTH)

    split(bisect_by=Plane.XZ.offset(-9.271), keep=Keep.TOP)

    split(bisect_by=Plane.XY.offset(29.21), keep=Keep.TOP)


with BuildPart() as f1_19:
    add(f1_18.part)

    # F13_t116: cut F13_tool117
    add(f13_tool117.part, mode=Mode.SUBTRACT)


with BuildPart() as f13_tool123:
    # F13_s124 → F13_t125 (new body)
    with BuildSketch(Plane.XY.offset(1.016)):
        with BuildLine():
            ThreePointArc((-19.304, -10.16), (-20.0224204897, -9.8624204897), (-20.32, -9.144))
            Line((-20.32, -9.144), (-20.32, -10.16))
            Line((-20.32, -10.16), (-19.304, -10.16))
        make_face()
    extrude(amount=F13_T125_DEPTH)

    split(bisect_by=Plane.XZ.offset(9.271), keep=Keep.TOP)

    split(bisect_by=Plane.XY.offset(26.67), keep=Keep.BOTTOM)


with BuildPart() as f1_20:
    add(f1_19.part)

    # F13_t122: cut F13_tool123
    add(f13_tool123.part, mode=Mode.SUBTRACT)


with BuildPart() as f13_tool129:
    # F13_s130 → F13_t131 (new body)
    with BuildSketch(Plane.XY.offset(1.016)):
        with BuildLine():
            ThreePointArc((-19.304, -10.16), (-20.0224204897, -9.8624204897), (-20.32, -9.144))
            Line((-20.32, -9.144), (-20.32, -10.16))
            Line((-20.32, -10.16), (-19.304, -10.16))
        make_face()
    extrude(amount=F13_T131_DEPTH)

    split(bisect_by=Plane.XZ.offset(9.271), keep=Keep.BOTTOM)

    split(bisect_by=Plane.XY.offset(26.67), keep=Keep.BOTTOM)


with BuildPart() as f1_21:
    add(f1_20.part)

    # F13_t128: cut F13_tool129
    add(f13_tool129.part, mode=Mode.SUBTRACT)


with BuildPart() as f13_tool135:
    # F13_s136 → F13_t137 (new body)
    with BuildSketch(Plane.XY.offset(1.016)):
        with BuildLine():
            ThreePointArc((-19.304, -10.16), (-20.0224204897, -9.8624204897), (-20.32, -9.144))
            Line((-20.32, -9.144), (-20.32, -10.16))
            Line((-20.32, -10.16), (-19.304, -10.16))
        make_face()
    extrude(amount=F13_T137_DEPTH)

    split(bisect_by=Plane.XZ.offset(9.271), keep=Keep.TOP)

    split(bisect_by=Plane.XY.offset(26.67), keep=Keep.TOP)

    split(bisect_by=Plane.XY.offset(29.21), keep=Keep.BOTTOM)


with BuildPart() as f1_22:
    add(f1_21.part)

    # F13_t134: cut F13_tool135
    add(f13_tool135.part, mode=Mode.SUBTRACT)


with BuildPart() as f13_tool142:
    # F13_s143 → F13_t144 (new body)
    with BuildSketch(Plane.XY.offset(1.016)):
        with BuildLine():
            ThreePointArc((-19.304, -10.16), (-20.0224204897, -9.8624204897), (-20.32, -9.144))
            Line((-20.32, -9.144), (-20.32, -10.16))
            Line((-20.32, -10.16), (-19.304, -10.16))
        make_face()
    extrude(amount=F13_T144_DEPTH)

    split(bisect_by=Plane.XZ.offset(9.271), keep=Keep.TOP)

    split(bisect_by=Plane.XY.offset(29.21), keep=Keep.TOP)


with BuildPart() as f1_23:
    add(f1_22.part)

    # F13_t141: cut F13_tool142
    add(f13_tool142.part, mode=Mode.SUBTRACT)


with BuildPart() as f13_tool148:
    # F13_s149 → F13_t150 (new body)
    with BuildSketch(Plane.XY.offset(1.016)):
        with BuildLine():
            ThreePointArc((-19.304, -10.16), (-20.0224204897, -9.8624204897), (-20.32, -9.144))
            Line((-20.32, -9.144), (-20.32, -10.16))
            Line((-20.32, -10.16), (-19.304, -10.16))
        make_face()
    extrude(amount=F13_T150_DEPTH)

    split(bisect_by=Plane.XZ.offset(9.271), keep=Keep.BOTTOM)

    split(bisect_by=Plane.XY.offset(29.21), keep=Keep.TOP)


with BuildPart() as f1_24:
    add(f1_23.part)

    # F13_t147: cut F13_tool148
    add(f13_tool148.part, mode=Mode.SUBTRACT)

    # F14 (on face) → F15 (join)
    with BuildSketch(Plane.XY.offset(37.719)):
        with Locations((10.8458, 0)):
            Circle(F14_R)
        with Locations((10.8458, 0)):
            Circle(F14_R_2, mode=Mode.SUBTRACT)
    extrude(amount=F15_DEPTH)


solid = f1_24.part
